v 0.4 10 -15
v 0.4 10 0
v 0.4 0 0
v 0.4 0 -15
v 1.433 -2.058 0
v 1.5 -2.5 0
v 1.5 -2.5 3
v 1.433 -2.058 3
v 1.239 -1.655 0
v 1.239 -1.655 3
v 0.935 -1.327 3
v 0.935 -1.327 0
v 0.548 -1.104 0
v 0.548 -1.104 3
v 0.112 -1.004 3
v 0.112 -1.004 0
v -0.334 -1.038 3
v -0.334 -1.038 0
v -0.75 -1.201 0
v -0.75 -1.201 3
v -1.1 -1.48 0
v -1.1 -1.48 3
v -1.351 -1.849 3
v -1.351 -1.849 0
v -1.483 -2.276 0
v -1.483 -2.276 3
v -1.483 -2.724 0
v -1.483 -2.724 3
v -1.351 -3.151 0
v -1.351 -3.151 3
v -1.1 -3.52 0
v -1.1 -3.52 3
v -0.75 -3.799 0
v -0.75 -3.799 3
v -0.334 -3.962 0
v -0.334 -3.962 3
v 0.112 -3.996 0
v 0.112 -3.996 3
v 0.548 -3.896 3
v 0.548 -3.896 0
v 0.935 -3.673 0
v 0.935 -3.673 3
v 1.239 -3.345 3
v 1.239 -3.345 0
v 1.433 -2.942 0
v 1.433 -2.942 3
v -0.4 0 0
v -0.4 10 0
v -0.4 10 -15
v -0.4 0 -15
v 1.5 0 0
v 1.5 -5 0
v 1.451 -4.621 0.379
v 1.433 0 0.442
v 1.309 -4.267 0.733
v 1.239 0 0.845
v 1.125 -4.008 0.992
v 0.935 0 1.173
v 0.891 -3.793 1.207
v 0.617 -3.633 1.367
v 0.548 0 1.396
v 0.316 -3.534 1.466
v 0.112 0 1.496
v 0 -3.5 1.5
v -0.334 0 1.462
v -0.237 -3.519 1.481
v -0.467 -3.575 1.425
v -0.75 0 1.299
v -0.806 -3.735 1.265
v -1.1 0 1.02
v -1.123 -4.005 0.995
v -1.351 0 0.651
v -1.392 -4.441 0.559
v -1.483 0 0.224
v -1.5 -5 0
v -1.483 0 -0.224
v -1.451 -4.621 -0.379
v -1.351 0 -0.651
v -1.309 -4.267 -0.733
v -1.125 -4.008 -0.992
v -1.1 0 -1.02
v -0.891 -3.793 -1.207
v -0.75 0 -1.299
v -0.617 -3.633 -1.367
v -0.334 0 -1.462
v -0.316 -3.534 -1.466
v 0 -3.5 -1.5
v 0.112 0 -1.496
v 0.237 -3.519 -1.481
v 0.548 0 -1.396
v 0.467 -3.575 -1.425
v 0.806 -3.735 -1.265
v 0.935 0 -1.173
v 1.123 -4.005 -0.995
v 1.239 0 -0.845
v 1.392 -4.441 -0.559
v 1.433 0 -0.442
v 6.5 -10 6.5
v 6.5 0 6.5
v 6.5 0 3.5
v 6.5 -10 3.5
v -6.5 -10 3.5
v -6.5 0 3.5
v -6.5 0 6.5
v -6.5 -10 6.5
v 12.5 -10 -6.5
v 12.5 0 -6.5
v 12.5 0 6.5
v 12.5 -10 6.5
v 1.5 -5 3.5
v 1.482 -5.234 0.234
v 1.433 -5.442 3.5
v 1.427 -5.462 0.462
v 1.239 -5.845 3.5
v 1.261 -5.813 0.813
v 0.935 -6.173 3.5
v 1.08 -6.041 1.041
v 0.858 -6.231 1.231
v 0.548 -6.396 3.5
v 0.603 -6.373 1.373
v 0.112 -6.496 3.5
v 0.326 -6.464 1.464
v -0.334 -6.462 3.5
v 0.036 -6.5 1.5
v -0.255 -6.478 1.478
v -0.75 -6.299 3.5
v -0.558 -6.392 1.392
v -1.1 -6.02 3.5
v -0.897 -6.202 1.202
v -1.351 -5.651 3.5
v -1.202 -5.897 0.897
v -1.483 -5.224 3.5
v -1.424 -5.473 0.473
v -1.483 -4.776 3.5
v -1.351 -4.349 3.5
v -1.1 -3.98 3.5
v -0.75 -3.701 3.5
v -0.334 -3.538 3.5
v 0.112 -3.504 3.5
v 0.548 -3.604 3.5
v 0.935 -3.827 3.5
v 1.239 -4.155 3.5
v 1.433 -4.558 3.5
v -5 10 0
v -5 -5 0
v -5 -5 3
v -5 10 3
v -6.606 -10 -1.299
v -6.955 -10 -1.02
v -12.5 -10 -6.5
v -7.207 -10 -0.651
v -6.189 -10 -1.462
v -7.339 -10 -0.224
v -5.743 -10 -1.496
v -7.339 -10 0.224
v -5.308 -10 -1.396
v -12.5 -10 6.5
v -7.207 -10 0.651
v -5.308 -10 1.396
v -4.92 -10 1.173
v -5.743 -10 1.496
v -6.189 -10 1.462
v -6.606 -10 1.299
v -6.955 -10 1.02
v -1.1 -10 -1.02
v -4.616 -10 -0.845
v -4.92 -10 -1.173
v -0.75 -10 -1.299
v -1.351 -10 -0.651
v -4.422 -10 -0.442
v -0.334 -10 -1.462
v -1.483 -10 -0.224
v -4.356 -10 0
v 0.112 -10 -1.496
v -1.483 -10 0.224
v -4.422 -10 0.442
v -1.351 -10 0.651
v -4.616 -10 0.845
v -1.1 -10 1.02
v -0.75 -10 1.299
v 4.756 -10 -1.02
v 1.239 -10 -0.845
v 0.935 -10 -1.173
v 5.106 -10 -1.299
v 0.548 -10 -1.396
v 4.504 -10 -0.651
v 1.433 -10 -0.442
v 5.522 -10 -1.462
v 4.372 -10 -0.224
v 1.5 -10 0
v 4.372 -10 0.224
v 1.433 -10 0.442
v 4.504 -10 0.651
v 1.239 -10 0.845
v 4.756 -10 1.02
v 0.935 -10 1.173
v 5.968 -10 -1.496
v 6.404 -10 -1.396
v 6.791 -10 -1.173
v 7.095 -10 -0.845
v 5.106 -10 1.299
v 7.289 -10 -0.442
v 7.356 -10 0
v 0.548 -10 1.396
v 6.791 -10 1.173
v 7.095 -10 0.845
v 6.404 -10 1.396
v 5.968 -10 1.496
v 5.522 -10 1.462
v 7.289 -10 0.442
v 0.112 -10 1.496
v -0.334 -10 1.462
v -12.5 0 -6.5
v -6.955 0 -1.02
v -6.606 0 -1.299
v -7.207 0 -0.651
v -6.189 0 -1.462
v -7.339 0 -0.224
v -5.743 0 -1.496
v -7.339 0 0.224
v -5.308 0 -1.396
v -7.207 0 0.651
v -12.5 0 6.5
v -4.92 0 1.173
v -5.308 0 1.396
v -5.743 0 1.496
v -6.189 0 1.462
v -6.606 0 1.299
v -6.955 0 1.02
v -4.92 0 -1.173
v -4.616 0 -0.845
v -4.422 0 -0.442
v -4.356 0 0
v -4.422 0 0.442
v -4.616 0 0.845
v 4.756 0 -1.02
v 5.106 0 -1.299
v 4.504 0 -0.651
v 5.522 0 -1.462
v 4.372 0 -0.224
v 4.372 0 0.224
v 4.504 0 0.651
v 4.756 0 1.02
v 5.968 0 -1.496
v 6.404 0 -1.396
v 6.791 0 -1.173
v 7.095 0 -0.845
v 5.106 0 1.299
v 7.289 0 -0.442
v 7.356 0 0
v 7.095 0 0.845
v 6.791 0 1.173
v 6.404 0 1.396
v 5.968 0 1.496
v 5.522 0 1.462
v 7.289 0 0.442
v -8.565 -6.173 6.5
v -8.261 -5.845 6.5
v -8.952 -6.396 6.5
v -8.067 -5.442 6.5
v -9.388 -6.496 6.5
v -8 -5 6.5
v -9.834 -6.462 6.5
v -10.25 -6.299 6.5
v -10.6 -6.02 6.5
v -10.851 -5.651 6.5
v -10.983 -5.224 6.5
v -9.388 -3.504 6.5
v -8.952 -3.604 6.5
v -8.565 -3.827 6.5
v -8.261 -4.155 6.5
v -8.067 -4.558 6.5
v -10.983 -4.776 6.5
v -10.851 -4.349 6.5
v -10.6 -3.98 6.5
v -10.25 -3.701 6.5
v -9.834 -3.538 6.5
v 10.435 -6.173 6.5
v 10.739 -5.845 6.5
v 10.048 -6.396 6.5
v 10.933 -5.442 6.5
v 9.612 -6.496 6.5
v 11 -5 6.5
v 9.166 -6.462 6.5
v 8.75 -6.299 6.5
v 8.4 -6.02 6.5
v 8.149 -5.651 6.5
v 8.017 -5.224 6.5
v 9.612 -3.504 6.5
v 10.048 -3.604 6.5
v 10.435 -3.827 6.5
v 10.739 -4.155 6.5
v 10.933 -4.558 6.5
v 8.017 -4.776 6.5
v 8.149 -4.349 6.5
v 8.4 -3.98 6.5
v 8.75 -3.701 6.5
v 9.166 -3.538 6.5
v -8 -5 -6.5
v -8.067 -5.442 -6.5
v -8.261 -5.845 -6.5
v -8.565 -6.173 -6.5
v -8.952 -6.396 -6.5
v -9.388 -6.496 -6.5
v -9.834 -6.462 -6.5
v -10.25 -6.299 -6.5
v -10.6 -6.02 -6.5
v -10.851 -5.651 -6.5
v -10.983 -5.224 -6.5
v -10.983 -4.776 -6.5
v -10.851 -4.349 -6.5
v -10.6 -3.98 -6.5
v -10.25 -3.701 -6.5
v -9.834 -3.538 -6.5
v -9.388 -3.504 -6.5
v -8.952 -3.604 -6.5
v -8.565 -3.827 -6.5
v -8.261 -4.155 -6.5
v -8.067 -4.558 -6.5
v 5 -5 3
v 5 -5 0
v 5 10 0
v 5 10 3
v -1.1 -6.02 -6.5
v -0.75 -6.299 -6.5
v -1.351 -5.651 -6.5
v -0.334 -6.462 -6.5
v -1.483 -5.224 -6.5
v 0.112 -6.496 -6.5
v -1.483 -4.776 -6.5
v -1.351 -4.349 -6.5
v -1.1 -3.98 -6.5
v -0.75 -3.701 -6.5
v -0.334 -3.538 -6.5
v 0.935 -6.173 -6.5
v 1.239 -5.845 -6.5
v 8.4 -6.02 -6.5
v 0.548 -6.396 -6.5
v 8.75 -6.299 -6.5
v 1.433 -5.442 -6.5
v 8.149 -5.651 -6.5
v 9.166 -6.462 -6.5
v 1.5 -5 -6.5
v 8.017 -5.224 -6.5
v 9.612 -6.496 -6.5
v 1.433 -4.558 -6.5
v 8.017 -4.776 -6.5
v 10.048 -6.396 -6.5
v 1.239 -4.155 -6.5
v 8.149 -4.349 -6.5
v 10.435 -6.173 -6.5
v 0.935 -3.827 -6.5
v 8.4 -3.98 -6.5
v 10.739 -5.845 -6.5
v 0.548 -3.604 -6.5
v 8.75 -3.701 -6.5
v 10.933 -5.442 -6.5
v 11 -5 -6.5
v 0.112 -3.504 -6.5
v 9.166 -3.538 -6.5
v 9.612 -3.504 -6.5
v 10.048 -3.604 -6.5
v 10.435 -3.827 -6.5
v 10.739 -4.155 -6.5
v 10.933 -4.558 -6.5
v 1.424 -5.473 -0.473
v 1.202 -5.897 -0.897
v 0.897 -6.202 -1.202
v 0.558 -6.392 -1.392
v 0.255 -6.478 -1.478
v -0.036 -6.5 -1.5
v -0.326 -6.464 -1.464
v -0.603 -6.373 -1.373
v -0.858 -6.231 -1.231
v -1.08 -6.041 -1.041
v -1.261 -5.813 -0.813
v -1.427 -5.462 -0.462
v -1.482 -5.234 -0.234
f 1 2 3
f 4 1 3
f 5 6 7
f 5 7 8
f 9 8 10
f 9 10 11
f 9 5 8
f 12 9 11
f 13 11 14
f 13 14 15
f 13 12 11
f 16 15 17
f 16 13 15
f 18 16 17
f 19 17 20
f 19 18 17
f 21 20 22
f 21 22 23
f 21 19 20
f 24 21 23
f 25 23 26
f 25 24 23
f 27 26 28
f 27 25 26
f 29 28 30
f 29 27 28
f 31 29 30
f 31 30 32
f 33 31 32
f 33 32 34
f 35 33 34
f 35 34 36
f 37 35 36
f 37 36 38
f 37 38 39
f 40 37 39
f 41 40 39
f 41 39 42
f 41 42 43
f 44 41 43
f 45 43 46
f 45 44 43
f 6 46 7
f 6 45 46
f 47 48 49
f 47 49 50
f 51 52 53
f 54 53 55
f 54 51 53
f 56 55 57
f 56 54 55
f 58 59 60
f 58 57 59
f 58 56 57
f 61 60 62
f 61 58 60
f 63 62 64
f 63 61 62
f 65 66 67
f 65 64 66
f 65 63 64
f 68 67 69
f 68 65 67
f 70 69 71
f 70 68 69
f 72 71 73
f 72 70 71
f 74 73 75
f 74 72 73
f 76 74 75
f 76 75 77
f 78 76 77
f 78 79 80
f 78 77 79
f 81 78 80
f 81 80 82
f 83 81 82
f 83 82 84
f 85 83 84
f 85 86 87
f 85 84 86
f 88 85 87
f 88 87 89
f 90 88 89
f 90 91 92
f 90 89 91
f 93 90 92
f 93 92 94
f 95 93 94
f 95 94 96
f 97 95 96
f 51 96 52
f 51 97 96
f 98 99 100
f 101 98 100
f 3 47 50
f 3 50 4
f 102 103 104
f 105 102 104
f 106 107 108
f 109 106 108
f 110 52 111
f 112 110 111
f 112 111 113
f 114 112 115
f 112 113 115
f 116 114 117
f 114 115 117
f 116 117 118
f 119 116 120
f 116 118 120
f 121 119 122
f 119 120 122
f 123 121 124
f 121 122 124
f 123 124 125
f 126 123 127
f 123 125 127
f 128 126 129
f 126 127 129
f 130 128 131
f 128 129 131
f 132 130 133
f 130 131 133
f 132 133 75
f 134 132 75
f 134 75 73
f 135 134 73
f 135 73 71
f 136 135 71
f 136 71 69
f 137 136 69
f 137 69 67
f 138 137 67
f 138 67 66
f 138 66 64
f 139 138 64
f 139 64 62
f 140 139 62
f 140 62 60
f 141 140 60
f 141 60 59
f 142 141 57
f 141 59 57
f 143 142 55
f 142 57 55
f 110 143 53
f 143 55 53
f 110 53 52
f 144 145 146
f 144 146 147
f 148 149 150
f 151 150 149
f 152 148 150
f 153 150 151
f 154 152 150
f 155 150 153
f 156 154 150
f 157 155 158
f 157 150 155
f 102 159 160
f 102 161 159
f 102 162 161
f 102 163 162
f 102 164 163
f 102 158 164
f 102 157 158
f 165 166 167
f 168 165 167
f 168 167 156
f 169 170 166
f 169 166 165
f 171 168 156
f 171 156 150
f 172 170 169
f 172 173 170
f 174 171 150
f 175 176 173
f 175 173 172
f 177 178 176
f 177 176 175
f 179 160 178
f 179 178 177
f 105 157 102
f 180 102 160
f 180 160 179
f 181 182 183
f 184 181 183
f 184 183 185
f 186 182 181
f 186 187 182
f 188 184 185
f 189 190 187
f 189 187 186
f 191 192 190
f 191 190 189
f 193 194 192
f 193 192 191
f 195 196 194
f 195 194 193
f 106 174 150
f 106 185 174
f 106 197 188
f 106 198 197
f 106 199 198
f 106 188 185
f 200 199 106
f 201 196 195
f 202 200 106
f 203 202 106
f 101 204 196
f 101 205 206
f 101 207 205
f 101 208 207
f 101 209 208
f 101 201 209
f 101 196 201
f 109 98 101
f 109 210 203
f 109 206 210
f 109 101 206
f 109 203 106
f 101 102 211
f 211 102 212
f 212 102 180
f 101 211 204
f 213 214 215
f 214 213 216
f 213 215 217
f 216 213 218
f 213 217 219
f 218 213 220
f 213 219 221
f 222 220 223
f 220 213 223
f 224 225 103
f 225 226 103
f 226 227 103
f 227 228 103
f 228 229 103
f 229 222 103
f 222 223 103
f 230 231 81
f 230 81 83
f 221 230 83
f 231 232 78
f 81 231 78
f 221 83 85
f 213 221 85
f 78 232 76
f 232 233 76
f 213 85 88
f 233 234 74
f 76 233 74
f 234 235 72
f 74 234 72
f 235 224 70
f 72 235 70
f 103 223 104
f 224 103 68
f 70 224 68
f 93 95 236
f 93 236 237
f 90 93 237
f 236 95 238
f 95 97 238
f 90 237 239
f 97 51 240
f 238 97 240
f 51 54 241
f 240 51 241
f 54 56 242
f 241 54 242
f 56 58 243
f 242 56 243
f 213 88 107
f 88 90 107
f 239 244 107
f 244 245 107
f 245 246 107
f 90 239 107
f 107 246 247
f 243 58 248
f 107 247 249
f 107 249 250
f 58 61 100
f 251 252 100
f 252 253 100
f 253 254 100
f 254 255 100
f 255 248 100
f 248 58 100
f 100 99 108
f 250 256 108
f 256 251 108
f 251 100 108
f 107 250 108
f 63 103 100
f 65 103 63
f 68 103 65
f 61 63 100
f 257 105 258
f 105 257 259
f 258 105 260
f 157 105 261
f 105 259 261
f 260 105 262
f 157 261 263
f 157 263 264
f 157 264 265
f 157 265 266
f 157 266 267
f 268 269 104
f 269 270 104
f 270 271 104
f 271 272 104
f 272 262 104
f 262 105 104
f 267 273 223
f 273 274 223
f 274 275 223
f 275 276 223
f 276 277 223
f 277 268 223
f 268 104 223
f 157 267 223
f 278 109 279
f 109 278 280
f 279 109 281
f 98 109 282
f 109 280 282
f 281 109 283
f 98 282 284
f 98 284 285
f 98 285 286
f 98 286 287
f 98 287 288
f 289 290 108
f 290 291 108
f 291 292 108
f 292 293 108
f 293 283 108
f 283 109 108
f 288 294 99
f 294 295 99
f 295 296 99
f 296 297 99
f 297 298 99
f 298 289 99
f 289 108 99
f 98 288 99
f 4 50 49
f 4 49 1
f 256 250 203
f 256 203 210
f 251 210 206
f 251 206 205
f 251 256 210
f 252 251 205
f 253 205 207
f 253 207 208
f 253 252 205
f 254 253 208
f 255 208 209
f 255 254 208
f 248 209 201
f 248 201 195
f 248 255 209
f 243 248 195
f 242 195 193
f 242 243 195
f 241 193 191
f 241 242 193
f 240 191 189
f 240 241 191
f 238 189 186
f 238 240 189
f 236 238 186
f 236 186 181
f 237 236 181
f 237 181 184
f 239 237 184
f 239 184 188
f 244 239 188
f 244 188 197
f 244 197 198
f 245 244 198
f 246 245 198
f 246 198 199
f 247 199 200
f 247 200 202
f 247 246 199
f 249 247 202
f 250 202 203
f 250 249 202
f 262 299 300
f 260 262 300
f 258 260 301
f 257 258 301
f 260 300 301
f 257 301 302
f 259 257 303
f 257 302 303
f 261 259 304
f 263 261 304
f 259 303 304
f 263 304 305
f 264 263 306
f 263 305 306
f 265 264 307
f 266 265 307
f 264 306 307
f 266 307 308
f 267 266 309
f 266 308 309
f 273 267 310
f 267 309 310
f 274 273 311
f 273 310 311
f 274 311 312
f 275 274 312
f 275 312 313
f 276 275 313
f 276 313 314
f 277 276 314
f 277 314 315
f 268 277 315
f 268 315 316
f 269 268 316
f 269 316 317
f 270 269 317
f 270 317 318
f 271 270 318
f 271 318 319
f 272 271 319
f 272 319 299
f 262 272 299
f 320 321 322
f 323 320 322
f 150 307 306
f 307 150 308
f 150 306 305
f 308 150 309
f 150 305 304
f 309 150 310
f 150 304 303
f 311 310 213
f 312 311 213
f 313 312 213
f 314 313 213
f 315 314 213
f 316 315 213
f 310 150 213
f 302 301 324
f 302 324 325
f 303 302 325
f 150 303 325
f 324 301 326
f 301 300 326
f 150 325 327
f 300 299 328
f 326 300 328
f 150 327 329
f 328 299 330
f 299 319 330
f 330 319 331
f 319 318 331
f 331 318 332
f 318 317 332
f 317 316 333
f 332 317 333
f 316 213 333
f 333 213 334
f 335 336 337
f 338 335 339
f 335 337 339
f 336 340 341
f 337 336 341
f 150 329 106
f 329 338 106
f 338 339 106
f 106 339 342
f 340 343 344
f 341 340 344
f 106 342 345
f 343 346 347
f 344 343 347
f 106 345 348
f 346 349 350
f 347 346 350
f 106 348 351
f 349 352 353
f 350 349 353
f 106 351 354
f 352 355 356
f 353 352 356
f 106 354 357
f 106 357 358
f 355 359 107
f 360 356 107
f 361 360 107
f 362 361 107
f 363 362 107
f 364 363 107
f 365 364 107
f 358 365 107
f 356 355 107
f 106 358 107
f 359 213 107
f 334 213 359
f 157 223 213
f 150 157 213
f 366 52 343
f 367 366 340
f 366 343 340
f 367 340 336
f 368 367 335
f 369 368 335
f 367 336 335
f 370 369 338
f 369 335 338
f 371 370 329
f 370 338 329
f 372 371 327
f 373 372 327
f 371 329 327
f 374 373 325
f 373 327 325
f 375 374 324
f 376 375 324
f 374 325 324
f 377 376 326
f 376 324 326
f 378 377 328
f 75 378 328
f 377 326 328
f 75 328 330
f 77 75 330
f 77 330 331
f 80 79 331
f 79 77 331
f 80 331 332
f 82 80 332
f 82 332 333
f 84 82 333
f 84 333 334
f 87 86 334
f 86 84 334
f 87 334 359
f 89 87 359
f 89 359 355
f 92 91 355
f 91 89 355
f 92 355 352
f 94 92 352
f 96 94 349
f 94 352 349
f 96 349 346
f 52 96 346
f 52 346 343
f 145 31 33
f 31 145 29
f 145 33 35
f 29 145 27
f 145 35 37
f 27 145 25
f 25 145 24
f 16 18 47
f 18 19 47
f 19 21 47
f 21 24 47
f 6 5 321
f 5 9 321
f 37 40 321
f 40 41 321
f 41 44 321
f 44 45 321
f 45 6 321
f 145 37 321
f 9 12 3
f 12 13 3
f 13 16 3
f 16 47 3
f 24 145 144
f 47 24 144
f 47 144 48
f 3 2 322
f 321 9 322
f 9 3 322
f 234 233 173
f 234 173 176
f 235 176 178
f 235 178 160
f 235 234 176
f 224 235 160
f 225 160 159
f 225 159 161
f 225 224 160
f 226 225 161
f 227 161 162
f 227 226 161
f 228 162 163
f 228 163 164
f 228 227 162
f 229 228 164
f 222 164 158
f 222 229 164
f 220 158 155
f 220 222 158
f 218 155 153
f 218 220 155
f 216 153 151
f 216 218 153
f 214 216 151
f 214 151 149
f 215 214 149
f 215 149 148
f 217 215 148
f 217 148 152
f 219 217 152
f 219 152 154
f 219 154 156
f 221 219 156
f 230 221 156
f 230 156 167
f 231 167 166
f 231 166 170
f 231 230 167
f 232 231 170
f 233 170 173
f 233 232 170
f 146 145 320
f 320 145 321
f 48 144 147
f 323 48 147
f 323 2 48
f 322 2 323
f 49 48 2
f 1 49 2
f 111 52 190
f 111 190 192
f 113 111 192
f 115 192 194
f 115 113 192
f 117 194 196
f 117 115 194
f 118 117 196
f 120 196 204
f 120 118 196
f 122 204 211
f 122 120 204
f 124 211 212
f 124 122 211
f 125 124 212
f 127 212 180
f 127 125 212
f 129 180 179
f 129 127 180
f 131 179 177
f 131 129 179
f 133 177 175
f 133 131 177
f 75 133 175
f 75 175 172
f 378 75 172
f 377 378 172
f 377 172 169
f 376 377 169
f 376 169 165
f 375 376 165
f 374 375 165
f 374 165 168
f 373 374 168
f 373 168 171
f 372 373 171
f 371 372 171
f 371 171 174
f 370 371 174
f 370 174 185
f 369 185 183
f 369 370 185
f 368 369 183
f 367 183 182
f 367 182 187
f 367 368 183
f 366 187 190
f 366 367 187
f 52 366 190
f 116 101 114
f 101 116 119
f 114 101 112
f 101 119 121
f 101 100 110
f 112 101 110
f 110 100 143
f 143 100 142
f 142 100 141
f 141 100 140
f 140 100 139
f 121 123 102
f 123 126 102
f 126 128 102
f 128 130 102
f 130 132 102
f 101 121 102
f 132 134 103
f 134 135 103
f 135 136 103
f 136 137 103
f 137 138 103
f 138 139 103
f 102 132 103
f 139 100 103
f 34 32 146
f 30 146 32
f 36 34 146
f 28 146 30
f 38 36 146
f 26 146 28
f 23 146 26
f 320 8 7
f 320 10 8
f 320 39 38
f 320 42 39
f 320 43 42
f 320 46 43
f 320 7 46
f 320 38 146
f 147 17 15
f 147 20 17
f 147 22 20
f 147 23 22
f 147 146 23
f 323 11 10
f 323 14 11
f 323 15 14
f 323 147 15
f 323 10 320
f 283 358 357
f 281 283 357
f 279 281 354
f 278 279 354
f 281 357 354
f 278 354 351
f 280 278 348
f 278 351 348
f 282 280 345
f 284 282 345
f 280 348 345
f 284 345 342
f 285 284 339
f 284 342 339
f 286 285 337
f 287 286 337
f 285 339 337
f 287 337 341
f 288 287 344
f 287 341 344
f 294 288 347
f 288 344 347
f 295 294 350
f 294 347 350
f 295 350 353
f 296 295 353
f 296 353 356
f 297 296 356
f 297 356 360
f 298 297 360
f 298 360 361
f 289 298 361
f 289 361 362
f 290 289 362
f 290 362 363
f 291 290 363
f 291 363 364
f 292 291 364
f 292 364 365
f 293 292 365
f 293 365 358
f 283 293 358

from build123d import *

# Parameters (mm, degrees)
SKETCH_R     = 1.5
PAD_DEPTH    = 10
SKETCH001_R  = 1.5
POCKET_DEPTH = 13.001
SKETCH002_W  = 10
SKETCH002_H  = 15
SKETCH002_R  = 1.5
PAD001_DEPTH = 3
SKETCH003_W  = 0.8
SKETCH003_H  = 10
PAD002_DEPTH = 15


with BuildPart() as optobarrier_holder:
    # Sketch → Pad (new body)
    with BuildSketch(Plane.XZ):
        Polygon((-12.5, 6.5), (-12.5, -6.5), (12.5, -6.5), (12.5, 6.5), (6.5, 6.5), (6.5, 3.5), (-6.5, 3.5), (-6.5, 6.5), align=None)
        with Locations((-5.85553, 0)):
            Circle(SKETCH_R, mode=Mode.SUBTRACT)
        Circle(SKETCH_R, mode=Mode.SUBTRACT)
        with Locations((5.85553, 0)):
            Circle(SKETCH_R, mode=Mode.SUBTRACT)
    extrude(amount=PAD_DEPTH)

    # Sketch001 (on Face2 of Pad) → Pocket (cut, through all)
    with BuildSketch(Plane(origin=(0, 0, -6.5), x_dir=(1, 0, 0), z_dir=(0, 0, -1))):
        with Locations((-9.5, 5)):
            Circle(SKETCH001_R)
        with Locations((0, 5)):
            Circle(SKETCH001_R)
        with Locations((9.5, 5)):
            Circle(SKETCH001_R)
    extrude(amount=-POCKET_DEPTH, mode=Mode.SUBTRACT)


with BuildPart() as optobarrier_plate:
    # Sketch002 → Pad001 (new body)
    with BuildSketch(Plane.XY):
        with Locations((0, 2.5)):
            Rectangle(SKETCH002_W, SKETCH002_H)
        with Locations((0, -2.5)):
            Circle(SKETCH002_R, mode=Mode.SUBTRACT)
    extrude(amount=PAD001_DEPTH)

    # Sketch003 (on Face6 of Pad001) → Pad002 (join)
    with BuildSketch(Plane(origin=(0, 0, 0), x_dir=(1, 0, 0), z_dir=(0, 0, -1))):
        with Locations((0, -5)):
            Rectangle(SKETCH003_W, SKETCH003_H)
    extrude(amount=PAD002_DEPTH)


solid = Compound([optobarrier_holder.part, optobarrier_plate.part])
